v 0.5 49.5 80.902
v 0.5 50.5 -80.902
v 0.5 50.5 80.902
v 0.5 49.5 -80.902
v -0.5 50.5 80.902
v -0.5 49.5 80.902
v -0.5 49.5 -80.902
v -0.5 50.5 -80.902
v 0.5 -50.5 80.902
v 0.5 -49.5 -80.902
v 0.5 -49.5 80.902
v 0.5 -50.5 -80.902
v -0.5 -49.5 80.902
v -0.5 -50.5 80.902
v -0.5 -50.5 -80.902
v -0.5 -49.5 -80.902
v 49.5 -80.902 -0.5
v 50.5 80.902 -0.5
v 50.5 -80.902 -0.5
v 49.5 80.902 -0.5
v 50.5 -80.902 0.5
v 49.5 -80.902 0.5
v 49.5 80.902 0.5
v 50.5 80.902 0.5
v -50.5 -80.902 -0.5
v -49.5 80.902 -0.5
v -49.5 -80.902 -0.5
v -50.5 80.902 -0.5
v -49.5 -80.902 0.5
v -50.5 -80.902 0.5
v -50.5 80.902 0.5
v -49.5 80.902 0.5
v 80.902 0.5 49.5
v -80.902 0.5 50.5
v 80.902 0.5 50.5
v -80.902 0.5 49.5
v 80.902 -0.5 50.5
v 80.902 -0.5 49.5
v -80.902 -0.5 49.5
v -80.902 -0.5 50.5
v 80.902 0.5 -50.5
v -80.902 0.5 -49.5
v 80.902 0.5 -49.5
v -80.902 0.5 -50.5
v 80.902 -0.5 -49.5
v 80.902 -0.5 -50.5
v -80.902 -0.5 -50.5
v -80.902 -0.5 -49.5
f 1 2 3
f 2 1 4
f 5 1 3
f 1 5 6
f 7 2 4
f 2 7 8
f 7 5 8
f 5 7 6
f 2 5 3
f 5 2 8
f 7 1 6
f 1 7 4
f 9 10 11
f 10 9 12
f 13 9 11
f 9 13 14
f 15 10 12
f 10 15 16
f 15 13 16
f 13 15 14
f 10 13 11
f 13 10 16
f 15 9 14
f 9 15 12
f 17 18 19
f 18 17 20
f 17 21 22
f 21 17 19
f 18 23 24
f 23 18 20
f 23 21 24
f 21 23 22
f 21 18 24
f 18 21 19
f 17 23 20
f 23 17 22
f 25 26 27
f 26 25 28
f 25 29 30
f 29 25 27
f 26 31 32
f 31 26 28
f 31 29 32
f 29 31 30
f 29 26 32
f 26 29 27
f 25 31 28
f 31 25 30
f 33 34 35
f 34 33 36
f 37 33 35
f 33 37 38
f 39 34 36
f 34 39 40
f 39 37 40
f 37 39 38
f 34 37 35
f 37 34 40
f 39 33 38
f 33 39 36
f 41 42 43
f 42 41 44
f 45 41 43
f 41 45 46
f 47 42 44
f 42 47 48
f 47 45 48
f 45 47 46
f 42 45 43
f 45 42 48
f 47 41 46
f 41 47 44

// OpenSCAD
/*  Make an Icosahedron

    Copyright © 2018 Simon Forman

    This file is part of Eumirion

    Eumirion is free software: you can redistribute it and/or modify
    it under the terms of the GNU General Public License as published by
    the Free Software Foundation, either version 3 of the License, or
    (at your option) any later version.

    Eumirion is distributed in the hope that it will be useful,
    but WITHOUT ANY WARRANTY; without even the implied warranty of
    MERCHANTABILITY or FITNESS FOR A PARTICULAR PURPOSE.  See the
    GNU General Public License for more details.

    You should have received a copy of the GNU General Public License
    along with Eumirion.  If not see <http://www.gnu.org/licenses/>.


The twelve verticies of an icosohedron form three Golden Rectangles.

 */


// The Golden Ratio of the long side to the short side is ~= 1.6180339...
phi = (1 + sqrt(5)) / 2;


R = 0.01;  // Very thin rods.


module golden_rectangle(n) {
    // Create a Golden Rectangle with short edge length of n.

    // In order to take the hull() of the rectangles they must actually
    // be very thin blocks.
    translate([0, n/2, 0]) {
        cube([n * R, n * R, n * phi], center=true);
    }
    translate([0, -n/2, 0]) {
        cube([n * R, n * R, n * phi], center=true);
    }
}

module rectangles(n) {
    // Create three Golden Rectangles and orient them into formation.
                        golden_rectangle(n);
    rotate([90, 90, 0]) golden_rectangle(n);
    rotate([90, 0, 90]) golden_rectangle(n);
}

module tri(n) {
    polyhedron(
        points=[
        [n, n*phi, 0],
        [n*phi, 0, n],
        [0, n, n*phi]],
        faces = [[0, 1, 2]]);
}

module foo(n) {tri(n); mirror()        tri(n);}
module bar(n) {foo(n); mirror([0,1,0]) foo(n);}
module baz(n) {bar(n); mirror([0,0,1]) bar(n);}

module ico() {
    rectangles(100);
    baz(50);
}

rotate([0, 0, -$t * 180]) ico();
